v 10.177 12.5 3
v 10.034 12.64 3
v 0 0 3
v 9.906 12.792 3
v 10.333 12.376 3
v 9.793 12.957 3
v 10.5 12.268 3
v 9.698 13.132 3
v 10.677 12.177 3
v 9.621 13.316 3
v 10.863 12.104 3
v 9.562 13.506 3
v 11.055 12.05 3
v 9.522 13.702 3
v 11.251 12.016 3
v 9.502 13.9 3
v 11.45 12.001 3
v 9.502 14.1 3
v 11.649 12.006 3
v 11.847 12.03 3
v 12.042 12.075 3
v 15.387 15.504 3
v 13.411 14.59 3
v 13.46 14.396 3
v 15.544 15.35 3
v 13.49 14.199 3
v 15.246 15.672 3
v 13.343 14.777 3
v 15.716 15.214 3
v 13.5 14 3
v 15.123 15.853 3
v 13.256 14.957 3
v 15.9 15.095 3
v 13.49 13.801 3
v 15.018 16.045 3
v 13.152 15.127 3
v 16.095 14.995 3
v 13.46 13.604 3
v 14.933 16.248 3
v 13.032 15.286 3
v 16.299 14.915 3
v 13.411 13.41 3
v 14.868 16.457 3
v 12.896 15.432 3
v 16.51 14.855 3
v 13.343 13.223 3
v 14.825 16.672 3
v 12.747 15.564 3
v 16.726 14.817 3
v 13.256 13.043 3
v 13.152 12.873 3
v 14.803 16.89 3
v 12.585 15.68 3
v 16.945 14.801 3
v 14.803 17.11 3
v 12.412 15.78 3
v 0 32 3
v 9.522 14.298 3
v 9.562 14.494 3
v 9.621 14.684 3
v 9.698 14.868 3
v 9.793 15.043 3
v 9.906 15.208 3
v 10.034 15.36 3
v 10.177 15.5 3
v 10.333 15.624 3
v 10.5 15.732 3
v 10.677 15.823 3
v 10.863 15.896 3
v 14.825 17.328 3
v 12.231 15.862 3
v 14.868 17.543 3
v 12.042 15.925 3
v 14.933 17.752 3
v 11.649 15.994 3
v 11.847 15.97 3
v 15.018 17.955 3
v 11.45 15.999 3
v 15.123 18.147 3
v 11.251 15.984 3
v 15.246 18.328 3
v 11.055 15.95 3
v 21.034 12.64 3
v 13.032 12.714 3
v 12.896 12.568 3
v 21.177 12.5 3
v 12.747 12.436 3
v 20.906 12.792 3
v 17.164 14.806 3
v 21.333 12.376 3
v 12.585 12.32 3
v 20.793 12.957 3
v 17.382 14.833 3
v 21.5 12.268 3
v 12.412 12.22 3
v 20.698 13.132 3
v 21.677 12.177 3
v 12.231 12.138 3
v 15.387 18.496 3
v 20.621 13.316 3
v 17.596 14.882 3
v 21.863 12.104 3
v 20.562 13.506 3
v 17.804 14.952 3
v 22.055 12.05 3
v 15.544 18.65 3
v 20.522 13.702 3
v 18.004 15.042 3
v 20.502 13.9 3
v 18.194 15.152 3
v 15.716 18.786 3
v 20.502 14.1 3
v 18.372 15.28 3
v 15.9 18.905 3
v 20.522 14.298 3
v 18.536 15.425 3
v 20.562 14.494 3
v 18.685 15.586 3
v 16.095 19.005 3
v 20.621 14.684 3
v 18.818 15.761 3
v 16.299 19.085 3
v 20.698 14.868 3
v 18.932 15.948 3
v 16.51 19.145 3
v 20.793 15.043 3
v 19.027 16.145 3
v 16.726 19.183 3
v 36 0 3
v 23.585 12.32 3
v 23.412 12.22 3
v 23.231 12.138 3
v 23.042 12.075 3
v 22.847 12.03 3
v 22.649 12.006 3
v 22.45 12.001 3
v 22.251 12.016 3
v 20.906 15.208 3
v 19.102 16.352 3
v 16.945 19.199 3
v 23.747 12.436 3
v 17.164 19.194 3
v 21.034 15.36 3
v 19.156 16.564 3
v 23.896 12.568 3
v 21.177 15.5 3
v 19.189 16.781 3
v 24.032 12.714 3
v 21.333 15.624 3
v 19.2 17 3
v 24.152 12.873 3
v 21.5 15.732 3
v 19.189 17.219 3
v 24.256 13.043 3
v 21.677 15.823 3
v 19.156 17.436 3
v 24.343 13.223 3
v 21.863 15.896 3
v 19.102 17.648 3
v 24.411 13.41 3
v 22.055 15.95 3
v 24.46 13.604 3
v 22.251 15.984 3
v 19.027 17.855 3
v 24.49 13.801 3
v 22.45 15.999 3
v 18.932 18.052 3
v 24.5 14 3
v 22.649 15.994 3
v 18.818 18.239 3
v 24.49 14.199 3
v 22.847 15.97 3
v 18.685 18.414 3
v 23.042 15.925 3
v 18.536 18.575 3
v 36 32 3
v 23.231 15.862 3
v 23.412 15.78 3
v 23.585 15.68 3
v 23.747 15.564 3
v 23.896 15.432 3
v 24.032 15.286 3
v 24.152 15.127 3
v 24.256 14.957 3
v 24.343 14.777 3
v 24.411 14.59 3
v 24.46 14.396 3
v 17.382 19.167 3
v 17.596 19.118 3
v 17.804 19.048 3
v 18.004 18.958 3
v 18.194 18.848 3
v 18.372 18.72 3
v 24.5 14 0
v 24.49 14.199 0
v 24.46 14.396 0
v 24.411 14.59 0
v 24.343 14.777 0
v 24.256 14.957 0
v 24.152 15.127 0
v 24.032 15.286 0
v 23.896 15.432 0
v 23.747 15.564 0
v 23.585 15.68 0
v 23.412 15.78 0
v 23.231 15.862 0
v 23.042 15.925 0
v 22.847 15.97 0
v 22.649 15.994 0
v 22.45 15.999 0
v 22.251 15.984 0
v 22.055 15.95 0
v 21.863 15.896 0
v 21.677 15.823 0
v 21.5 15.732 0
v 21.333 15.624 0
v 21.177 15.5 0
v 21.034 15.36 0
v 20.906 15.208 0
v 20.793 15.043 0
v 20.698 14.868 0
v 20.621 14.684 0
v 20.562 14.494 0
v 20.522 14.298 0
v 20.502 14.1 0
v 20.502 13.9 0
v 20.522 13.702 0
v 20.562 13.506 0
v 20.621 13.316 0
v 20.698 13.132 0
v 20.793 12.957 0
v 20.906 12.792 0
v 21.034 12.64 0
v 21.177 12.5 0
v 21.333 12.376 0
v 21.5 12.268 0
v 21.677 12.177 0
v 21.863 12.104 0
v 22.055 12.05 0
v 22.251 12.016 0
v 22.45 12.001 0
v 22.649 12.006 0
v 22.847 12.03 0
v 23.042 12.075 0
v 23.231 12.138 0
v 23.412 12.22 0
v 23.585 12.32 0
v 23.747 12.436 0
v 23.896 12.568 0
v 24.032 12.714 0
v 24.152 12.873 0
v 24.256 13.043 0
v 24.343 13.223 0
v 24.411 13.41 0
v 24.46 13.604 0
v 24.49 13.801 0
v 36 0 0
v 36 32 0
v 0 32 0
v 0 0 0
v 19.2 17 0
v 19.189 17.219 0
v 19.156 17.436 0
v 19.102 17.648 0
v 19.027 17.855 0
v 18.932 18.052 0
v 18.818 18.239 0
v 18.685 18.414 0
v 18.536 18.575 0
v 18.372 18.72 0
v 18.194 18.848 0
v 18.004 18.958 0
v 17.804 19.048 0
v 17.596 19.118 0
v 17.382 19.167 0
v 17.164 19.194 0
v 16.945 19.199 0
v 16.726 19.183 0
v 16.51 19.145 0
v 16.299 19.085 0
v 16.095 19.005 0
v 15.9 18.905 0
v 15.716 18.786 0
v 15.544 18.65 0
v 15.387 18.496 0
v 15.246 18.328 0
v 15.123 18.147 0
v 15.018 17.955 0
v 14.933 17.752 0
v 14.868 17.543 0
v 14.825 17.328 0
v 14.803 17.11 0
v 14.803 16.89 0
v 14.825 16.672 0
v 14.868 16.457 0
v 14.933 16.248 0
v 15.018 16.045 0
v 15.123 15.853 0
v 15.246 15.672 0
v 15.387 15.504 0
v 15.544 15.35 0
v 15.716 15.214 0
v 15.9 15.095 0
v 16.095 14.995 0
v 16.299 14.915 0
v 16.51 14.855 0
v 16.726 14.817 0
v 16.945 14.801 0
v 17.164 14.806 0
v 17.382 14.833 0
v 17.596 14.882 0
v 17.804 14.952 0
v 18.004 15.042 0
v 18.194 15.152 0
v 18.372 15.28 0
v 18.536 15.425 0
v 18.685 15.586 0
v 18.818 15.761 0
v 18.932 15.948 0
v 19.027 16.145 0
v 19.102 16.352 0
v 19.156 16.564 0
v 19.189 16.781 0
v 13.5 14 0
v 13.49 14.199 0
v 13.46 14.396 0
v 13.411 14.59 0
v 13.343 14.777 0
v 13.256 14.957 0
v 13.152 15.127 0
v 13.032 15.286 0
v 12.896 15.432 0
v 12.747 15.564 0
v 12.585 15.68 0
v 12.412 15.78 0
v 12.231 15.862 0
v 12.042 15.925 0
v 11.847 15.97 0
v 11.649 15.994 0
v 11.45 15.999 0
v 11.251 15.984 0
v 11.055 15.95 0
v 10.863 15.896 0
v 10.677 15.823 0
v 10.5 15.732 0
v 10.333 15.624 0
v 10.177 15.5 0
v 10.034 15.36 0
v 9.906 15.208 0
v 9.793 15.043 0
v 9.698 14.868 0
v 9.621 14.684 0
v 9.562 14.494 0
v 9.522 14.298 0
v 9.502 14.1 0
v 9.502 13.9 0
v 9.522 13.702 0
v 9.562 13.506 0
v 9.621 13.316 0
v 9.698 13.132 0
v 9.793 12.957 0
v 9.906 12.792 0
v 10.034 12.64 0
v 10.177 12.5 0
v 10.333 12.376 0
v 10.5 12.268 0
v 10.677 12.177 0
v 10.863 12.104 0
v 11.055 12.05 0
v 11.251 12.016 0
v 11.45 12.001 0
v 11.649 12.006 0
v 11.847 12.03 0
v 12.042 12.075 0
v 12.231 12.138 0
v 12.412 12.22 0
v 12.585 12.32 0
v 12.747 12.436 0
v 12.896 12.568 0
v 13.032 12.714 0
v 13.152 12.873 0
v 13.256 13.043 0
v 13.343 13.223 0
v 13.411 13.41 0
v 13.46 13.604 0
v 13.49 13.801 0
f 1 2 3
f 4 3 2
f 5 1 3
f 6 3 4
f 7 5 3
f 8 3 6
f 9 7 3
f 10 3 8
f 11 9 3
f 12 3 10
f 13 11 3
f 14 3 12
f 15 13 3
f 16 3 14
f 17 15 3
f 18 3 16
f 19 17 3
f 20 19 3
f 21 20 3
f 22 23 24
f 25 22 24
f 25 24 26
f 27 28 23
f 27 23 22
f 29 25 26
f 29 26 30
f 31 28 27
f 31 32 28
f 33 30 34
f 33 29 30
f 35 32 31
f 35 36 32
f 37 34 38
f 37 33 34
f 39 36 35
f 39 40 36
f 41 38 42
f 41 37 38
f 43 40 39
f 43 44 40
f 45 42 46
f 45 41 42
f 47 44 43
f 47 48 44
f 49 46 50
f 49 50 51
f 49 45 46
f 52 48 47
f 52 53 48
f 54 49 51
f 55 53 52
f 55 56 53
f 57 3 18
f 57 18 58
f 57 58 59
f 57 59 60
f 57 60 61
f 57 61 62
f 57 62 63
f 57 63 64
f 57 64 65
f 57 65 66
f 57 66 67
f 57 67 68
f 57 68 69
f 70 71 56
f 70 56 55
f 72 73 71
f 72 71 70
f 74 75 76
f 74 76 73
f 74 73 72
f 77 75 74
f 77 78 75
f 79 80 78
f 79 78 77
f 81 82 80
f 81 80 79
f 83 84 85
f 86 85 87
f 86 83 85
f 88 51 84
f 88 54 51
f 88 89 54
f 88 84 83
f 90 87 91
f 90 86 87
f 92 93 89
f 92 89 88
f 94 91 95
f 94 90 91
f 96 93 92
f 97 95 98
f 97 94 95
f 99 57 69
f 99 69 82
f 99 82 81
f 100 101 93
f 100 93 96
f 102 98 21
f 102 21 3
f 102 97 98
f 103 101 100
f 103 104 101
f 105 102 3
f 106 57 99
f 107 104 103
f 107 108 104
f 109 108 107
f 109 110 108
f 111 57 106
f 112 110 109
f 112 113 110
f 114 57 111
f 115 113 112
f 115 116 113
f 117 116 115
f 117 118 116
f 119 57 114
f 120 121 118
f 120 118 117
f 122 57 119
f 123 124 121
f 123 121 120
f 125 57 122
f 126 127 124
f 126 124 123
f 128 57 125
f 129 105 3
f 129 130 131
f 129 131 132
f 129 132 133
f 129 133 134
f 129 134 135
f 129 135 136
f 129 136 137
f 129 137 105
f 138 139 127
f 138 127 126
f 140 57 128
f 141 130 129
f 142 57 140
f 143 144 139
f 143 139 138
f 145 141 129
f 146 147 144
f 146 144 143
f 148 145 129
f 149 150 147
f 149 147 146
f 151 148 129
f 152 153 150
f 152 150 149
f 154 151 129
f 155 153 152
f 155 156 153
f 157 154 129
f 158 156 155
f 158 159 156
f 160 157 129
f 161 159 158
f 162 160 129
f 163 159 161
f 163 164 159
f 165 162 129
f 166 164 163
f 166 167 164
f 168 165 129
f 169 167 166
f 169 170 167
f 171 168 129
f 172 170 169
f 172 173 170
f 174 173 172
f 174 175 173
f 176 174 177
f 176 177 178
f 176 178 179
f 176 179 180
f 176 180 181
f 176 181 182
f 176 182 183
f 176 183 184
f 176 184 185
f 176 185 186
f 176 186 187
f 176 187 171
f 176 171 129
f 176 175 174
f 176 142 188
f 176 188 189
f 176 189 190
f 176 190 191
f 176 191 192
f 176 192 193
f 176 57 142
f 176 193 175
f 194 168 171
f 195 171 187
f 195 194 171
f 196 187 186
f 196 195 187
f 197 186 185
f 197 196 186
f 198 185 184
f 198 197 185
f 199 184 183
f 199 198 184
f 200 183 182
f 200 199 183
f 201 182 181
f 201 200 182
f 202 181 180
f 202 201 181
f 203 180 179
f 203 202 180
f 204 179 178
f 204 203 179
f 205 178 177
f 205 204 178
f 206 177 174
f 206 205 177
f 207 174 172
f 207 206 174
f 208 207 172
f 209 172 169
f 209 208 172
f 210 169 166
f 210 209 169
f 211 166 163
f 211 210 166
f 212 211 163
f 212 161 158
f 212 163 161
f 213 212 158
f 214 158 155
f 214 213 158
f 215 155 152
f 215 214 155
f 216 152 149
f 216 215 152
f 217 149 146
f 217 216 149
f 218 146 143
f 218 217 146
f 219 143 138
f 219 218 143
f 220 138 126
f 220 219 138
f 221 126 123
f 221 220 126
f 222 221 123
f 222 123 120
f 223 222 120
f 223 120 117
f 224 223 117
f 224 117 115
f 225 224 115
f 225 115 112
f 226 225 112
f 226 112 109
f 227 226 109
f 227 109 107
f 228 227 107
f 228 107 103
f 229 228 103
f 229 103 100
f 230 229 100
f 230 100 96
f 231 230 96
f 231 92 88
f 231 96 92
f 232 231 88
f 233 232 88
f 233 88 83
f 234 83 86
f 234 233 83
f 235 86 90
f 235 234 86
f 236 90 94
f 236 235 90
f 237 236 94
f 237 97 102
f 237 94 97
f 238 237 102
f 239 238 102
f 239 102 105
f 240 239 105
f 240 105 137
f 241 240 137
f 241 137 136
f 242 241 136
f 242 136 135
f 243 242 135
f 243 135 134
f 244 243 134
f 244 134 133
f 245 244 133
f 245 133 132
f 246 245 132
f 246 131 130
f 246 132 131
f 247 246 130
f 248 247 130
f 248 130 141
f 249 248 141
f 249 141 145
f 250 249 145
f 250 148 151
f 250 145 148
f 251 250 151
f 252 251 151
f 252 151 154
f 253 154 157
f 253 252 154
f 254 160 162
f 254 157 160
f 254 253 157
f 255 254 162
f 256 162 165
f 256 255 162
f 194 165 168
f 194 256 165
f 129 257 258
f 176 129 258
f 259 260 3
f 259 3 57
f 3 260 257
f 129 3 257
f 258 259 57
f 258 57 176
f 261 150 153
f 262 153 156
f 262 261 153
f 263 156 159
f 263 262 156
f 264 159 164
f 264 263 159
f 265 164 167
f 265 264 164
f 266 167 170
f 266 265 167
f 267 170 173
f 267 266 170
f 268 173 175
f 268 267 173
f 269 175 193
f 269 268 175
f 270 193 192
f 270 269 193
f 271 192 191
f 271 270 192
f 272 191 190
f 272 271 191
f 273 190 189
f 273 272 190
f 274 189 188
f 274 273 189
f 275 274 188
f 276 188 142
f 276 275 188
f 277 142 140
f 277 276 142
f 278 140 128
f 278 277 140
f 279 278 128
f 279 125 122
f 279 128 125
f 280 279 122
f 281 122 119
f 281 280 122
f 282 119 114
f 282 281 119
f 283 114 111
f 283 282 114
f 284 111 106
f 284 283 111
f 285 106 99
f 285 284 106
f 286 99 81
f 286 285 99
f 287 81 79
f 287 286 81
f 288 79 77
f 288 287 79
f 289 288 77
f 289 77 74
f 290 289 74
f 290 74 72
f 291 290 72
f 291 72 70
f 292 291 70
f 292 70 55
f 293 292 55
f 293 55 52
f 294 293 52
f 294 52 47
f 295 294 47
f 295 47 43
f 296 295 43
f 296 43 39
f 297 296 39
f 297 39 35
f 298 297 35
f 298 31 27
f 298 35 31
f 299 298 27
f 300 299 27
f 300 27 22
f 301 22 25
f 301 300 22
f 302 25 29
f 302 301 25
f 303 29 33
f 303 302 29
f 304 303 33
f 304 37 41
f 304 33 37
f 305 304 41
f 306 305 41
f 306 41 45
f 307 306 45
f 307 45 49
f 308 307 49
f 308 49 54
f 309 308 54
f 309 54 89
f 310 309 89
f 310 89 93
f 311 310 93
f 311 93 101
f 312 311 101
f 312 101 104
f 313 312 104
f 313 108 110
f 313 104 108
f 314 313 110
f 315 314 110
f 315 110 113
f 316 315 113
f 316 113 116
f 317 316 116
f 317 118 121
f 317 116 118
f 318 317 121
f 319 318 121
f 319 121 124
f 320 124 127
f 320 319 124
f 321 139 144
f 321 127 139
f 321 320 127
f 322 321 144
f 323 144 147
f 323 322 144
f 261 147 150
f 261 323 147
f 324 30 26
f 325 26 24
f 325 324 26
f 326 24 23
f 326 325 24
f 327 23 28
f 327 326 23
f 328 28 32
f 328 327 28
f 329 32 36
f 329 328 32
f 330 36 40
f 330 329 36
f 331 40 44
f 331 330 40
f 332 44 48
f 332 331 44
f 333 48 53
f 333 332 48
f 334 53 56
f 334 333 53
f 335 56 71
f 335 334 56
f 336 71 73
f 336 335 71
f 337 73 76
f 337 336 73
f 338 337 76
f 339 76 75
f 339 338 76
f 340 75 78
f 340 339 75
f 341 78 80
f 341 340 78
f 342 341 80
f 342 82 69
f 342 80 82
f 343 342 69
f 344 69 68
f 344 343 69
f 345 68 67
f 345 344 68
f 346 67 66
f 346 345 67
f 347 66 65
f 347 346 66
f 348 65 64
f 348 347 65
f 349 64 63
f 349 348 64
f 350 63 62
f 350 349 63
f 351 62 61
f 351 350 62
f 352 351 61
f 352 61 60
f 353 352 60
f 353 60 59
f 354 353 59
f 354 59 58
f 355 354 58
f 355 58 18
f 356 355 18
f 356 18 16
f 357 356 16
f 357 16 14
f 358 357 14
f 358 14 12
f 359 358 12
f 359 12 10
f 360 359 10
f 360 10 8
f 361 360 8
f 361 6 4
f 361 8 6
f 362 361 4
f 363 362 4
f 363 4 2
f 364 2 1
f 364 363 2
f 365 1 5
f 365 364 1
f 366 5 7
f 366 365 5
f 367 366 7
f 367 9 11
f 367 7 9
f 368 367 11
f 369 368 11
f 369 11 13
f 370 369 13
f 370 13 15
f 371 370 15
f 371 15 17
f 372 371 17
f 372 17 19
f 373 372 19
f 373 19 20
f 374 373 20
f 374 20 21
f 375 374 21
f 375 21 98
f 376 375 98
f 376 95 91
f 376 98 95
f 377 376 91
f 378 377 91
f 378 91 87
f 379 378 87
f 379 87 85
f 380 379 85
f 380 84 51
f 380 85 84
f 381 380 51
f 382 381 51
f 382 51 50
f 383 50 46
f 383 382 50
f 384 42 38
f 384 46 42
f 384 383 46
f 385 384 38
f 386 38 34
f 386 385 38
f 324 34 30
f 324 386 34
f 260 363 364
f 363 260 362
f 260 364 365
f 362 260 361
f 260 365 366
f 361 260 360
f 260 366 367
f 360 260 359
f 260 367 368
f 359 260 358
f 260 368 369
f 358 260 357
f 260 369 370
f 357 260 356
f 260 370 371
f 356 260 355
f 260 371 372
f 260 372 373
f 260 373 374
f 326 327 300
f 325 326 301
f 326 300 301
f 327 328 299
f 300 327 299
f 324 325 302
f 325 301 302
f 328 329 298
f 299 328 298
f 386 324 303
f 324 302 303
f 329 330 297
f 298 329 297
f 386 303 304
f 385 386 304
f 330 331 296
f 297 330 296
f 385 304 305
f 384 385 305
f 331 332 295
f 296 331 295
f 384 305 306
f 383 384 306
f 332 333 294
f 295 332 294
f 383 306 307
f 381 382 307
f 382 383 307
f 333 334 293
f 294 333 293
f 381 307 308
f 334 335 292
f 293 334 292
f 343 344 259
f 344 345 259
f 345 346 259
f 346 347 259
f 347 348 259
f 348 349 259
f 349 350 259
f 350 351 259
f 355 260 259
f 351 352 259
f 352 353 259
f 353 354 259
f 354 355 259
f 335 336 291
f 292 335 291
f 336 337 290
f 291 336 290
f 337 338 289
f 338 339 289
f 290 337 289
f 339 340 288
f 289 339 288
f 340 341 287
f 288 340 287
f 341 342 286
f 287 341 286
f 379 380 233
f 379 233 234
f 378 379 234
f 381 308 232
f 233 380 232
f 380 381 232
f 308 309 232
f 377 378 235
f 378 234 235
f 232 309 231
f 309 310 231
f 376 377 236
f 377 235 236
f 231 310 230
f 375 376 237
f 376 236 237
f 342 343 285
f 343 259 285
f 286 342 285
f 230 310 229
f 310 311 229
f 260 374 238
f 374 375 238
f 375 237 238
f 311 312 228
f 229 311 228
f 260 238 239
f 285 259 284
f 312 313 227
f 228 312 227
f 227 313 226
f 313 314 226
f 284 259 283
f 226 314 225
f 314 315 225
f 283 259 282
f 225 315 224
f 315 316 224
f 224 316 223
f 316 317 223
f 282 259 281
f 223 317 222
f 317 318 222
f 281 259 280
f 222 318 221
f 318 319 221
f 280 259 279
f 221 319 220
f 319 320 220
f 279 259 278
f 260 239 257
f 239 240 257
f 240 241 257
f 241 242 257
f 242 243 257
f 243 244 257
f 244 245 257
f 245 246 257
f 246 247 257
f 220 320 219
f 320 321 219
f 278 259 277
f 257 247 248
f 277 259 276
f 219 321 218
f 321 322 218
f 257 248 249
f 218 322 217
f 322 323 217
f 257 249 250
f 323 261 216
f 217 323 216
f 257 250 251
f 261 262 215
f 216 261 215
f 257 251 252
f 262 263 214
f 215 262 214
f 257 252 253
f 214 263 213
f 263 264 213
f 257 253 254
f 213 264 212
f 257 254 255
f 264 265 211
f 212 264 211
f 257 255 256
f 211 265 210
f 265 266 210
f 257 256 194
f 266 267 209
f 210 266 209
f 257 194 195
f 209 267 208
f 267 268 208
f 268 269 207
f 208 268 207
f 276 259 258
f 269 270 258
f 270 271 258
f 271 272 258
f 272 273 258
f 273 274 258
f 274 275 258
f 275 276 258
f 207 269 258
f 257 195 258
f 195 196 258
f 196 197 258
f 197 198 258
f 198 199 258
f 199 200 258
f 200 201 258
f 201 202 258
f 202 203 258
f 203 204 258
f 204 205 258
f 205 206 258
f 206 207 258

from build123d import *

# Parameters (mm, degrees)
CYLINDER008_R     = 2.2
CYLINDER008_DEPTH = 10
CYLINDER007_R     = 2
CYLINDER007_DEPTH = 10
CYLINDER006_R     = 2
CYLINDER006_DEPTH = 10
BOX004_W          = 36
BOX004_H          = 32
BOX004_DEPTH      = 3


with BuildPart() as cylinder008:
    # Cylinder008 → Cylinder008 (new body)
    with BuildSketch(Plane(origin=(17, 17, 0), x_dir=(1, 0, 0), z_dir=(0, 0, 1))):
        Circle(CYLINDER008_R)
    extrude(amount=CYLINDER008_DEPTH)


with BuildPart() as cylinder007:
    # Cylinder007 → Cylinder007 (new body)
    with BuildSketch(Plane(origin=(22.5, 14, 0), x_dir=(1, 0, 0), z_dir=(0, 0, 1))):
        Circle(CYLINDER007_R)
    extrude(amount=CYLINDER007_DEPTH)


with BuildPart() as cylinder006:
    # Cylinder006 → Cylinder006 (new body)
    with BuildSketch(Plane(origin=(11.5, 14, 0), x_dir=(1, 0, 0), z_dir=(0, 0, 1))):
        Circle(CYLINDER006_R)
    extrude(amount=CYLINDER006_DEPTH)


with BuildPart() as manual_valve_plate:
    # Box004 → Box004 (new body)
    with BuildSketch(Plane.XY):
        with Locations((18, 16)):
            Rectangle(BOX004_W, BOX004_H)
    extrude(amount=BOX004_DEPTH)

    # Cut: cut Cylinder006
    add(cylinder006.part, mode=Mode.SUBTRACT)

    # Cut007: cut Cylinder007
    add(cylinder007.part, mode=Mode.SUBTRACT)

    # Cut008: cut Cylinder008
    add(cylinder008.part, mode=Mode.SUBTRACT)


solid = manual_valve_plate.part
